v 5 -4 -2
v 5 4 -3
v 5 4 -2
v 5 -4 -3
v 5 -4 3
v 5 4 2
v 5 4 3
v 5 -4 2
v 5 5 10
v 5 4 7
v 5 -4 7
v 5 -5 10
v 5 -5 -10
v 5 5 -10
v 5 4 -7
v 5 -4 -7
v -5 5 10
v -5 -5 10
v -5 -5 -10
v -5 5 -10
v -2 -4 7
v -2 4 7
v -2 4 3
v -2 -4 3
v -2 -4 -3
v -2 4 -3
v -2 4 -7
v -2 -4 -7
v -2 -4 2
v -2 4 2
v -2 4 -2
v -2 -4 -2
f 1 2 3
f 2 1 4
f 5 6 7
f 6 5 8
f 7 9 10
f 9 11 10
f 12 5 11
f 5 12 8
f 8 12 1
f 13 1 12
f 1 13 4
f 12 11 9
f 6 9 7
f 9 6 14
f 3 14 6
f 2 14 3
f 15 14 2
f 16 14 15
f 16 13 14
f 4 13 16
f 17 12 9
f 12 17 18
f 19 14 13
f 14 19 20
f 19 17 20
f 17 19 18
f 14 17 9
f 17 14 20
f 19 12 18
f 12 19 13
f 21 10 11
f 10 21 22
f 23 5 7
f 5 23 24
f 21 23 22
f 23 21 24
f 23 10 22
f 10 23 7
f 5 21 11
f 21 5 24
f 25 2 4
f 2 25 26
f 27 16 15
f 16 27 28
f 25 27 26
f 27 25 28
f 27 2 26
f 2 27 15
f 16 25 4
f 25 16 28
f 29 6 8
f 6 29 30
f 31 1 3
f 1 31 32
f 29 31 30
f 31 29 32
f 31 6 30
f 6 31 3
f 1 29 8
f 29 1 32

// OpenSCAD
difference(){
color("chocolate")
cube([10,10,20],center=true);

translate([2,0,5])
cube([8,8,4],center=true);

translate([2,0,-5])

cube([8,8,4],center=true);


translate([2,0,0])
cube([8,8,4],center=true);

translate([2,0,-5])
cube([8,8,4],center=true);
}
